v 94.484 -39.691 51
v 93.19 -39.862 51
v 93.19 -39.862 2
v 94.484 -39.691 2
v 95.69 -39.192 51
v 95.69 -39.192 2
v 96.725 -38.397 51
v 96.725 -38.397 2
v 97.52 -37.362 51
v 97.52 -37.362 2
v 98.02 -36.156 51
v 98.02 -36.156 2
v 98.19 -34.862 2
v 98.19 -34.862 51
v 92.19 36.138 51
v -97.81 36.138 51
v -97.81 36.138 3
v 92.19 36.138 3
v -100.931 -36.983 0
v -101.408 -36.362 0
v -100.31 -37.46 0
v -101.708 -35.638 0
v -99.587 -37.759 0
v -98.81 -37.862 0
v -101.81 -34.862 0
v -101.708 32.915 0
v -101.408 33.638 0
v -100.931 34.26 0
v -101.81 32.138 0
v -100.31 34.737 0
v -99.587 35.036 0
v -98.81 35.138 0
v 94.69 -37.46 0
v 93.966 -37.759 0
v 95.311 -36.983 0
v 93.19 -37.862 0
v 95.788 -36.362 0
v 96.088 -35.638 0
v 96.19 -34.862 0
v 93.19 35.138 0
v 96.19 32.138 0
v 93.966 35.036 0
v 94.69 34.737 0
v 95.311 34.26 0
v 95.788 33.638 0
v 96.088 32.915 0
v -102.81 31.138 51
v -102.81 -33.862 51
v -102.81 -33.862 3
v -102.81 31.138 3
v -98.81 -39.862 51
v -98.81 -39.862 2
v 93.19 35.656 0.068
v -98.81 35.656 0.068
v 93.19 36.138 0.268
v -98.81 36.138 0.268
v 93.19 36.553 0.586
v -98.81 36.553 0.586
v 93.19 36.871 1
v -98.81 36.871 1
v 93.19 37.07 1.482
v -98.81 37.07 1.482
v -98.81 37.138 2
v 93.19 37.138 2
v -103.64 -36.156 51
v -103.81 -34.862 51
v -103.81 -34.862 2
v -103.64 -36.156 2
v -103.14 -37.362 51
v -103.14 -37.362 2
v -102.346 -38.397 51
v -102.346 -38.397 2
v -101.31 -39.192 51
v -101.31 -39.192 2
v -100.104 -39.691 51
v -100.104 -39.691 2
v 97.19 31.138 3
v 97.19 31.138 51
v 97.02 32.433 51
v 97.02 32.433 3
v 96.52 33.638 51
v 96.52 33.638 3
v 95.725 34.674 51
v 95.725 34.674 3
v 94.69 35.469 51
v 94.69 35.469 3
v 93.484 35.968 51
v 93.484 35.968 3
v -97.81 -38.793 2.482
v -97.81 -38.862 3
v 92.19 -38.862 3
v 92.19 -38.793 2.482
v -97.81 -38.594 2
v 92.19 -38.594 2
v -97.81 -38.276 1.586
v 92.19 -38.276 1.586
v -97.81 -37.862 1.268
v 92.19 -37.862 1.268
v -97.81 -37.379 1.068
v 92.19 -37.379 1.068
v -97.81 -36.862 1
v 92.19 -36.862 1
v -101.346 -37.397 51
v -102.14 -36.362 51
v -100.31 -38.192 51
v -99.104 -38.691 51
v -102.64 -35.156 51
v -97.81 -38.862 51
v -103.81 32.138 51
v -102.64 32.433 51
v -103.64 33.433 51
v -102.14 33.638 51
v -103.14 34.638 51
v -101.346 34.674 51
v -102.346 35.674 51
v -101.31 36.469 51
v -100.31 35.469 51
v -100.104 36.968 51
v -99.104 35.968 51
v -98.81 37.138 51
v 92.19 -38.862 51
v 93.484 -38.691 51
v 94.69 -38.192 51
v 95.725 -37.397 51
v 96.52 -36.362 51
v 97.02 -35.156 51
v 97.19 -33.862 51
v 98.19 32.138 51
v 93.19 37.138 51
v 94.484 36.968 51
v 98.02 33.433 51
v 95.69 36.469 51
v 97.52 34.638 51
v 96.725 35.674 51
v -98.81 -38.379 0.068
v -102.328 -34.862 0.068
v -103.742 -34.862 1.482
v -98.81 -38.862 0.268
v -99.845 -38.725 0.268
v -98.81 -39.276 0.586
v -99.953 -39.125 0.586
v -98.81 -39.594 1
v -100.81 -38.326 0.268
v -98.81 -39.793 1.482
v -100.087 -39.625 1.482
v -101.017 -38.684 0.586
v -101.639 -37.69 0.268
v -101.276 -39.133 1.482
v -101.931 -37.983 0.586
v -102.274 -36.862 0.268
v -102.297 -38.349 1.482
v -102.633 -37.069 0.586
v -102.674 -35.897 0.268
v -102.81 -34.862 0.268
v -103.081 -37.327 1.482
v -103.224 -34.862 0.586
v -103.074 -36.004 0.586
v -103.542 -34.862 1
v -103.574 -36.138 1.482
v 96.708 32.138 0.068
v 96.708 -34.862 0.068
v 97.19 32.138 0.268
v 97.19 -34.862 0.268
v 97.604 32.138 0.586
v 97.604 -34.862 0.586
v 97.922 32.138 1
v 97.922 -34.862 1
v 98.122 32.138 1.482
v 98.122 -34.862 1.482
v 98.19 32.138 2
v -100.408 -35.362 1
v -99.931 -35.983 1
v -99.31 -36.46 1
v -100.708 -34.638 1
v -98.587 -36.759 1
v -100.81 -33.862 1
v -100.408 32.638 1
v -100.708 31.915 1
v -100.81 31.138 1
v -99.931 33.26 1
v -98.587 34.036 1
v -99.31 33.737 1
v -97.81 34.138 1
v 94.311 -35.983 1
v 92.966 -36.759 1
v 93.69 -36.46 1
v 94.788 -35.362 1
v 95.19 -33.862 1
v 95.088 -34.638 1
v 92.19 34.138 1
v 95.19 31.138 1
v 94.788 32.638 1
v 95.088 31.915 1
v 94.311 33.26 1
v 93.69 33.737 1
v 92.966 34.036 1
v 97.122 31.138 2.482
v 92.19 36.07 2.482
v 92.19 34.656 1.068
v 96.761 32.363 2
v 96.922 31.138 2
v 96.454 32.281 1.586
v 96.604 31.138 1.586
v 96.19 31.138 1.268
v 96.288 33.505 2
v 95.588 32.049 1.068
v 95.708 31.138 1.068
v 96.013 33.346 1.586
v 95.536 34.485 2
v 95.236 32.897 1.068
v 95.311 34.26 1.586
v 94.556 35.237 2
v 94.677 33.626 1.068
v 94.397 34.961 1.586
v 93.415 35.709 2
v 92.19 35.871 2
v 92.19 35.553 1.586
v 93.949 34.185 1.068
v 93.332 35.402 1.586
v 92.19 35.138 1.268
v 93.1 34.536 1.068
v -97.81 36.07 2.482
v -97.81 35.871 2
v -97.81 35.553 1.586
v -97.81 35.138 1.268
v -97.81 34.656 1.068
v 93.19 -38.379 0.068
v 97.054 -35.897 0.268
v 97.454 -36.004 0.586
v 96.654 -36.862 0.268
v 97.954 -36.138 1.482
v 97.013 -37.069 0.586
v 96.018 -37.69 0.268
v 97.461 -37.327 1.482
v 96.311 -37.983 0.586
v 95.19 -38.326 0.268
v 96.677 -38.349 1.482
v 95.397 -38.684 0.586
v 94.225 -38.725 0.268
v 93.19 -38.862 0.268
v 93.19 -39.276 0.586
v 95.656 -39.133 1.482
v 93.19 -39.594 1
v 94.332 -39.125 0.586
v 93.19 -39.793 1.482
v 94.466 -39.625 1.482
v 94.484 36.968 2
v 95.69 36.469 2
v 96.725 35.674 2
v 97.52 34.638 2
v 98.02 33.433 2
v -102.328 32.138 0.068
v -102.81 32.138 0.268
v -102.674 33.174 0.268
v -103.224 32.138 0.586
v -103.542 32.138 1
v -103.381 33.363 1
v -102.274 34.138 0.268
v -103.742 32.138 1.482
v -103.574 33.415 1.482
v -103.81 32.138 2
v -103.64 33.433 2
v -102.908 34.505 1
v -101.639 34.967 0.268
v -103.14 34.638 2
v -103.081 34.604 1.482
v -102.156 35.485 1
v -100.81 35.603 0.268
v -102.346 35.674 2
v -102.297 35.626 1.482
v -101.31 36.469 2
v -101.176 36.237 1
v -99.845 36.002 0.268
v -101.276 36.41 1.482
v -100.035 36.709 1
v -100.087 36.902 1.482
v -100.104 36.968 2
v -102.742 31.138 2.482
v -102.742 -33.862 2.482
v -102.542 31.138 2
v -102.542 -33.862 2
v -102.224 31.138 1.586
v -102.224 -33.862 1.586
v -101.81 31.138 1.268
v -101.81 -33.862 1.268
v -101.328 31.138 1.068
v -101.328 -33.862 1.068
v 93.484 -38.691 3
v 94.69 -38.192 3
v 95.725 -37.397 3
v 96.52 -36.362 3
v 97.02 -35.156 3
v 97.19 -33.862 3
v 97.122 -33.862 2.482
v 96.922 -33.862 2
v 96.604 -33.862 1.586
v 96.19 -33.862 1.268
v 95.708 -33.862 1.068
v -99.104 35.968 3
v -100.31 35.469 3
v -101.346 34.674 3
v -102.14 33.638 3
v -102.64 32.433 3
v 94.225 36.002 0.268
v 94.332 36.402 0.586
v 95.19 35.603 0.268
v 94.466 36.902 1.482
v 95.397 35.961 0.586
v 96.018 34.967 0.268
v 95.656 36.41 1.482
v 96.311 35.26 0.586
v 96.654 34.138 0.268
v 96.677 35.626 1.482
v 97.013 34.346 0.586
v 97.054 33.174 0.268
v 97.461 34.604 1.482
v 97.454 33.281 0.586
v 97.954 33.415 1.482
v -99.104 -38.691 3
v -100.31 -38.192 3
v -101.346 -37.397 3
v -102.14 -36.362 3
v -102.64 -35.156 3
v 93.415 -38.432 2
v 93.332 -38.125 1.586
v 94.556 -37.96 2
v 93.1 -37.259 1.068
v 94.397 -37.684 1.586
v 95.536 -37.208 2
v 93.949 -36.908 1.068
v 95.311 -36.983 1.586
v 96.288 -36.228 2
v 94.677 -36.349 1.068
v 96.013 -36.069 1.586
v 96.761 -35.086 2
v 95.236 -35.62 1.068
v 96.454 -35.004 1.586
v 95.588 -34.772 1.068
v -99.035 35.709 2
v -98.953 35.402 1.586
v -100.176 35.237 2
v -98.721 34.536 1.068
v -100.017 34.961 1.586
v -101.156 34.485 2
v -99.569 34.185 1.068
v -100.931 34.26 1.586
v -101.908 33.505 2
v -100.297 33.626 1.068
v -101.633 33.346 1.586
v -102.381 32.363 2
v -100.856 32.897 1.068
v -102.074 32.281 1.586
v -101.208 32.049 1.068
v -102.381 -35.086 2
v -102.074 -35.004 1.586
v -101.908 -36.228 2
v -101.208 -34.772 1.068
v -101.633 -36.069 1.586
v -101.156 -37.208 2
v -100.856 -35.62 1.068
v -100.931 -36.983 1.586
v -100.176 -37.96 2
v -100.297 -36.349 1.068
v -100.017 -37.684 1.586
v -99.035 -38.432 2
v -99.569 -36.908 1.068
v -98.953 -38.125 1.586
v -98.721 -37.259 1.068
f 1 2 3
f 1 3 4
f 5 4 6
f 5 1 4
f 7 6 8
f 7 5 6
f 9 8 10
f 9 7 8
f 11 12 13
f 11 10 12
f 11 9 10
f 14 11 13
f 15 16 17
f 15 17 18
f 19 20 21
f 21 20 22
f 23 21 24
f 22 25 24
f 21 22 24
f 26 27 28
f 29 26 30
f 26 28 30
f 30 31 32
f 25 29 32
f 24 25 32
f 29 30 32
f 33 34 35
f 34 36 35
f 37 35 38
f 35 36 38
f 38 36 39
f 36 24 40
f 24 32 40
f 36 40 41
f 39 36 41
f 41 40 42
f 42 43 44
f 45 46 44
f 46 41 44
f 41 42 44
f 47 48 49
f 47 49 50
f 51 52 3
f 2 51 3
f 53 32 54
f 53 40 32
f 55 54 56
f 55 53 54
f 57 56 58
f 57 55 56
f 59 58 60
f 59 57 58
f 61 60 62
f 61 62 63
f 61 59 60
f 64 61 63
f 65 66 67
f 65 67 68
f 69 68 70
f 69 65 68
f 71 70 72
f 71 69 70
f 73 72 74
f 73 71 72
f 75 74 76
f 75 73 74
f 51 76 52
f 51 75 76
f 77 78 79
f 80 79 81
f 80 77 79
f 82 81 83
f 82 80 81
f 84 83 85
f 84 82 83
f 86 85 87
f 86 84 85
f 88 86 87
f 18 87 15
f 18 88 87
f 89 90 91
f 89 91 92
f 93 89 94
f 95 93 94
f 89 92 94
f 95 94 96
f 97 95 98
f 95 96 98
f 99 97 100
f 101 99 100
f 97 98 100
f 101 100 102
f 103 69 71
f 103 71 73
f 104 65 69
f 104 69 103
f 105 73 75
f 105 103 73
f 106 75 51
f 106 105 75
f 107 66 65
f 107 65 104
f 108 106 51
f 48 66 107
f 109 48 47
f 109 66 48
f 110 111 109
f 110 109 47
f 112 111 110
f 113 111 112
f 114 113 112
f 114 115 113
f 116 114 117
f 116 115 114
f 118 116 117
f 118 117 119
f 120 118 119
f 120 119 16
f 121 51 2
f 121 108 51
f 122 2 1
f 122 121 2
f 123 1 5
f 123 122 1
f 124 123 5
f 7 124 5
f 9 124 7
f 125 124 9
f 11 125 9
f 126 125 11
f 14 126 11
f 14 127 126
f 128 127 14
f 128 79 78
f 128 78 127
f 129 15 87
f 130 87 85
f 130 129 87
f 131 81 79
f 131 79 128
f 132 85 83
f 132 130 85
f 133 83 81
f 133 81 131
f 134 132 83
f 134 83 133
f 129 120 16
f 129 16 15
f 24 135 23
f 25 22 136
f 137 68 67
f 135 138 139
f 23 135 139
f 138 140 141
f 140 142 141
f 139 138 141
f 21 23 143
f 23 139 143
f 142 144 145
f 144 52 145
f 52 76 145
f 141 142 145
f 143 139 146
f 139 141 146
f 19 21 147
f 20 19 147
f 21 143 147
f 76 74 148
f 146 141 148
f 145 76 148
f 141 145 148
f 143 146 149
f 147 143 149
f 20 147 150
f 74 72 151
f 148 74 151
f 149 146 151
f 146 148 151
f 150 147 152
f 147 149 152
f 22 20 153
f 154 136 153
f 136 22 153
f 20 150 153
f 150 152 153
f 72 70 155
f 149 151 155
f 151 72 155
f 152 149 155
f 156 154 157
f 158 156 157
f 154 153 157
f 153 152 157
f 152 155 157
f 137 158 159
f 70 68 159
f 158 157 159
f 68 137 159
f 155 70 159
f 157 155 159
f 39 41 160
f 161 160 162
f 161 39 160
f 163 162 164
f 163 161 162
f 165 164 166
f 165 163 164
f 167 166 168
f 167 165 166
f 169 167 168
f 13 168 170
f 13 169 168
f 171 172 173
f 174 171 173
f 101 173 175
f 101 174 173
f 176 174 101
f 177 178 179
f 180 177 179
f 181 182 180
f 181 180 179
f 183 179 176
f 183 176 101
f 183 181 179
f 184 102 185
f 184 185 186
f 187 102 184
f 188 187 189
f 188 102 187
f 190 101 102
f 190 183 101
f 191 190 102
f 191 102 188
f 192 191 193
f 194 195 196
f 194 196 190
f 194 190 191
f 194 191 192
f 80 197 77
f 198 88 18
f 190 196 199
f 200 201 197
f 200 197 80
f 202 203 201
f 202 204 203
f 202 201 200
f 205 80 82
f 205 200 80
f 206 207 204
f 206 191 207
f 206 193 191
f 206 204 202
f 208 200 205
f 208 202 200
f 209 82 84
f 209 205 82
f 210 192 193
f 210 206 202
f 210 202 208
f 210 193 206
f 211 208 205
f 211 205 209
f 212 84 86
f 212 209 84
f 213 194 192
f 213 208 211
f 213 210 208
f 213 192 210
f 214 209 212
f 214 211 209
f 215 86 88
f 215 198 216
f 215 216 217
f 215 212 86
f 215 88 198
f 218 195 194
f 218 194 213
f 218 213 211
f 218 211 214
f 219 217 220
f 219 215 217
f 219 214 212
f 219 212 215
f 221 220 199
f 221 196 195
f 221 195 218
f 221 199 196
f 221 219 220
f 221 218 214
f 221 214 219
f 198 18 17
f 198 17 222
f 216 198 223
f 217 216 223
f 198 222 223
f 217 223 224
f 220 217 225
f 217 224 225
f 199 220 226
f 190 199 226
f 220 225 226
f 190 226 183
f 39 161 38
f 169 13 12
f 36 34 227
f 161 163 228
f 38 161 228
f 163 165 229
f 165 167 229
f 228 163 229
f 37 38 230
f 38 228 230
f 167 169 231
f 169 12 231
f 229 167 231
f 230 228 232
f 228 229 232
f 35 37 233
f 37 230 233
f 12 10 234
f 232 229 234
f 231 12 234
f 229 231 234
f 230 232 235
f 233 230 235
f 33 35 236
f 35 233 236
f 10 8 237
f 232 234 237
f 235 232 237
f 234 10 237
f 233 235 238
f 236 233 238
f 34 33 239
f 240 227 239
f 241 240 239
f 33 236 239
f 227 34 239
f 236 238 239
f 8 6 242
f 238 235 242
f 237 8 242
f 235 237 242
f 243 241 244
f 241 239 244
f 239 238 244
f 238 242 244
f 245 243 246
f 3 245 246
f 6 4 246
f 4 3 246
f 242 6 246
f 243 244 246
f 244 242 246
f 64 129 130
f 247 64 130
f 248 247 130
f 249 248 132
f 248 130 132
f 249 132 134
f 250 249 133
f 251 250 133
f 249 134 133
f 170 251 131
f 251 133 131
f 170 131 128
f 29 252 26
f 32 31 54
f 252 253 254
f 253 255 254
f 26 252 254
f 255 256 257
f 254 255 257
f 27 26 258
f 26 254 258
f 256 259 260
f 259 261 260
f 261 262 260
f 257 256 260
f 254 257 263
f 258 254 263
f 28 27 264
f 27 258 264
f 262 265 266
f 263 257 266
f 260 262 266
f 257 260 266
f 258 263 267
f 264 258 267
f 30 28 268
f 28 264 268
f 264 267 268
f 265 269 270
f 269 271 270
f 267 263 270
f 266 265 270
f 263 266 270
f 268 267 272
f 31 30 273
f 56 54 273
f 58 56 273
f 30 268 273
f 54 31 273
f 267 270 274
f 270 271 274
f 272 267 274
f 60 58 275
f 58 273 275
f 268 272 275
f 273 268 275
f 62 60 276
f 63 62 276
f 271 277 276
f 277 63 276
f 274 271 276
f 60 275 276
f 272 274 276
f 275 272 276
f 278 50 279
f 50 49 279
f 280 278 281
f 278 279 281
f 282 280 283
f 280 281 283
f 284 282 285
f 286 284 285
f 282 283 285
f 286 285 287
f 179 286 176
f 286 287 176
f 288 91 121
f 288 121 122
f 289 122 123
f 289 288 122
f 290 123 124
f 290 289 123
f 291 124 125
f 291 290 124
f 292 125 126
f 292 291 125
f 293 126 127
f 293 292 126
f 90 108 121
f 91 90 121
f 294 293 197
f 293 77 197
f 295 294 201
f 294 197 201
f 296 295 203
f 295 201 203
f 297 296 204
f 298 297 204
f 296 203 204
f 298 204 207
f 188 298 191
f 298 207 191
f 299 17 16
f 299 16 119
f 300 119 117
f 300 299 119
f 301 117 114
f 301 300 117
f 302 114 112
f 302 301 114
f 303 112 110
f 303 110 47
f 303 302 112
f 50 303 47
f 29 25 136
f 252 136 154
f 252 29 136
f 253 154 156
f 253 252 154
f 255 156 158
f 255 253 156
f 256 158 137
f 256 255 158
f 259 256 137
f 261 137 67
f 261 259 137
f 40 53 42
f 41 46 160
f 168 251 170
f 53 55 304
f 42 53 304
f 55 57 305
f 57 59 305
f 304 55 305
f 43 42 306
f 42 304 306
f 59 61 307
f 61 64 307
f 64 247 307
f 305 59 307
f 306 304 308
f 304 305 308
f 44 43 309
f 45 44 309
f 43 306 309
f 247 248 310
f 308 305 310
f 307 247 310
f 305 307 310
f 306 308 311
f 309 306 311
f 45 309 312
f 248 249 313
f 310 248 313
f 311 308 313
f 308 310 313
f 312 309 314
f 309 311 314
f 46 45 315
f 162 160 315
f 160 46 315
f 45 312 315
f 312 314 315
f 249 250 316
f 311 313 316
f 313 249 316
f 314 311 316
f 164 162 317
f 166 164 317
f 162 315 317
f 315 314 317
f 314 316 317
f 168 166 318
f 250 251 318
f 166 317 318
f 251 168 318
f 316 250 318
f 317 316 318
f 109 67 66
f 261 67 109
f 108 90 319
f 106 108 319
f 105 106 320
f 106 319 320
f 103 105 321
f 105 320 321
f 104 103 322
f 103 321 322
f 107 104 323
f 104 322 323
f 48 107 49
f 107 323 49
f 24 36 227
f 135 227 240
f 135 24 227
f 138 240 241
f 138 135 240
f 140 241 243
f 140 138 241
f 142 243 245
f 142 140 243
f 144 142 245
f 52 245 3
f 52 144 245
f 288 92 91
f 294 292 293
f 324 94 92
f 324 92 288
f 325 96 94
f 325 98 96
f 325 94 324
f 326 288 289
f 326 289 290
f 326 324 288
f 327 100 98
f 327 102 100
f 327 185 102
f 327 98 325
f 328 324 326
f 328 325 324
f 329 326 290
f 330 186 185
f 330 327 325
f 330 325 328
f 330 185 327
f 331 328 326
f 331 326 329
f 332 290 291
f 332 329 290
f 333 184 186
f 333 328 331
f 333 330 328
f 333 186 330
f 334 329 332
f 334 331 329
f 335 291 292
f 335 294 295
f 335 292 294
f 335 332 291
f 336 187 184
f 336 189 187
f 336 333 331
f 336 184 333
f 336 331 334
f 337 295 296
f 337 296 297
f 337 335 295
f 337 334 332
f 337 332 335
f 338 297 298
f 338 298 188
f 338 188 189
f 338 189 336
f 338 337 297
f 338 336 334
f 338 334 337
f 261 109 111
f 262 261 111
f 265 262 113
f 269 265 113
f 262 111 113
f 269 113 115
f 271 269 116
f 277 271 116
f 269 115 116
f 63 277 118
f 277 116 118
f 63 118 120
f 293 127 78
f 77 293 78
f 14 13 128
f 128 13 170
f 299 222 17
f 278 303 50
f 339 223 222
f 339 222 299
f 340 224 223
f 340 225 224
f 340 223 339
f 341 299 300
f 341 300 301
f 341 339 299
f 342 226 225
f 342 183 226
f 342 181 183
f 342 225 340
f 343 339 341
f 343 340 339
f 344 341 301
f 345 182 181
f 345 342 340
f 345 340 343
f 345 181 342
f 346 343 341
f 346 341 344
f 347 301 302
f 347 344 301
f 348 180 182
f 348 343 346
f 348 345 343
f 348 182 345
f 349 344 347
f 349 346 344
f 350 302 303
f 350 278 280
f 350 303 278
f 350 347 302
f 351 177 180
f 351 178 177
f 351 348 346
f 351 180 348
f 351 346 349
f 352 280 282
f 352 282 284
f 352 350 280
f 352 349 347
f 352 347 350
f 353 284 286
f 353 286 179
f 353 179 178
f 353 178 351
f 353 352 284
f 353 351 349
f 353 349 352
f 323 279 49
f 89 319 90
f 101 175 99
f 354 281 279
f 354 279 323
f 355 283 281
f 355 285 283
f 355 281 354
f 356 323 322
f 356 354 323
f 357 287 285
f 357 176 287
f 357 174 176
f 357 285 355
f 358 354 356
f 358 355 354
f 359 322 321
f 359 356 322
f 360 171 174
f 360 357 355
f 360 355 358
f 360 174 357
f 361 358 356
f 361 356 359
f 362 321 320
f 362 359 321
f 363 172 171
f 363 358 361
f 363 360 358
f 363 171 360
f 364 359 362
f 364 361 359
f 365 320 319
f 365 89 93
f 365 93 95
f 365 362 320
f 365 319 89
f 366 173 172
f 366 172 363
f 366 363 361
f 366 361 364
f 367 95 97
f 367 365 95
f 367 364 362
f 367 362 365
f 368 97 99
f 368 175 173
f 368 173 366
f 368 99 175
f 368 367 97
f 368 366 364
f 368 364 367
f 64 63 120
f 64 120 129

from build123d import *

# Parameters (mm, degrees)
F0_W     = 202
F0_H     = 77
F1_DEPTH = 51
F2_W     = 200
F2_H     = 75
F3_DEPTH = 50
F4_R     = 5
F5_R     = 2


# Not quite as in the source:
# - a feature of the source that left no trace in its solid (it failed there, or was rolled back) is left out


with BuildPart() as f1:
    # F0 (on Top) → F1 (new body)
    with BuildSketch(Plane.XY):
        with Locations((-2.8100872189, -1.361513185)):
            Rectangle(F0_W, F0_H)
    extrude(amount=F1_DEPTH)

    # F2 (on face) → F3 (cut)
    with BuildSketch(Plane.XY.offset(51)):
        with Locations((-2.8100872189, -1.361513185)):
            Rectangle(F2_W, F2_H)
    extrude(amount=-F3_DEPTH, mode=Mode.SUBTRACT)

    # F4
    f4_edges = [f1.edges().sort_by_distance(p)[0] for p in [
        (97.189913, 36.138487, 26),
        (-102.810087, 36.138487, 26),
        (97.189913, -38.861513, 26),
        (-102.810087, -38.861513, 26),
        (98.189913, 37.138487, 25.5),
        (-103.810087, 37.138487, 25.5),
        (98.189913, -39.861513, 25.5),
        (-103.810087, -39.861513, 25.5),
    ]]
    fillet(f4_edges, radius=F4_R)

    # F5
    f5_edges = [f1.edges().sort_by_distance(p)[0] for p in [
        (97.189913, -1.361513, 1),
        (-2.810087, 36.138487, 1),
        (-2.810087, -38.861513, 1),
        (-2.810087, 37.138487, 0),
        (96.725447, 35.674021, 0),
        (-102.345621, 35.674021, 0),
        (98.189913, -1.361513, 0),
        (-103.810087, -1.361513, 0),
        (96.725447, -38.397047, 0),
        (-102.345621, -38.397047, 0),
        (-2.810087, -39.861513, 0),
        (95.725447, -37.397047, 1),
        (95.725447, 34.674021, 1),
        (-101.345621, -37.397047, 1),
        (-101.345621, 34.674021, 1),
        (-102.810087, -1.361513, 1),
    ]]
    fillet(f5_edges, radius=F5_R)


solid = f1.part
